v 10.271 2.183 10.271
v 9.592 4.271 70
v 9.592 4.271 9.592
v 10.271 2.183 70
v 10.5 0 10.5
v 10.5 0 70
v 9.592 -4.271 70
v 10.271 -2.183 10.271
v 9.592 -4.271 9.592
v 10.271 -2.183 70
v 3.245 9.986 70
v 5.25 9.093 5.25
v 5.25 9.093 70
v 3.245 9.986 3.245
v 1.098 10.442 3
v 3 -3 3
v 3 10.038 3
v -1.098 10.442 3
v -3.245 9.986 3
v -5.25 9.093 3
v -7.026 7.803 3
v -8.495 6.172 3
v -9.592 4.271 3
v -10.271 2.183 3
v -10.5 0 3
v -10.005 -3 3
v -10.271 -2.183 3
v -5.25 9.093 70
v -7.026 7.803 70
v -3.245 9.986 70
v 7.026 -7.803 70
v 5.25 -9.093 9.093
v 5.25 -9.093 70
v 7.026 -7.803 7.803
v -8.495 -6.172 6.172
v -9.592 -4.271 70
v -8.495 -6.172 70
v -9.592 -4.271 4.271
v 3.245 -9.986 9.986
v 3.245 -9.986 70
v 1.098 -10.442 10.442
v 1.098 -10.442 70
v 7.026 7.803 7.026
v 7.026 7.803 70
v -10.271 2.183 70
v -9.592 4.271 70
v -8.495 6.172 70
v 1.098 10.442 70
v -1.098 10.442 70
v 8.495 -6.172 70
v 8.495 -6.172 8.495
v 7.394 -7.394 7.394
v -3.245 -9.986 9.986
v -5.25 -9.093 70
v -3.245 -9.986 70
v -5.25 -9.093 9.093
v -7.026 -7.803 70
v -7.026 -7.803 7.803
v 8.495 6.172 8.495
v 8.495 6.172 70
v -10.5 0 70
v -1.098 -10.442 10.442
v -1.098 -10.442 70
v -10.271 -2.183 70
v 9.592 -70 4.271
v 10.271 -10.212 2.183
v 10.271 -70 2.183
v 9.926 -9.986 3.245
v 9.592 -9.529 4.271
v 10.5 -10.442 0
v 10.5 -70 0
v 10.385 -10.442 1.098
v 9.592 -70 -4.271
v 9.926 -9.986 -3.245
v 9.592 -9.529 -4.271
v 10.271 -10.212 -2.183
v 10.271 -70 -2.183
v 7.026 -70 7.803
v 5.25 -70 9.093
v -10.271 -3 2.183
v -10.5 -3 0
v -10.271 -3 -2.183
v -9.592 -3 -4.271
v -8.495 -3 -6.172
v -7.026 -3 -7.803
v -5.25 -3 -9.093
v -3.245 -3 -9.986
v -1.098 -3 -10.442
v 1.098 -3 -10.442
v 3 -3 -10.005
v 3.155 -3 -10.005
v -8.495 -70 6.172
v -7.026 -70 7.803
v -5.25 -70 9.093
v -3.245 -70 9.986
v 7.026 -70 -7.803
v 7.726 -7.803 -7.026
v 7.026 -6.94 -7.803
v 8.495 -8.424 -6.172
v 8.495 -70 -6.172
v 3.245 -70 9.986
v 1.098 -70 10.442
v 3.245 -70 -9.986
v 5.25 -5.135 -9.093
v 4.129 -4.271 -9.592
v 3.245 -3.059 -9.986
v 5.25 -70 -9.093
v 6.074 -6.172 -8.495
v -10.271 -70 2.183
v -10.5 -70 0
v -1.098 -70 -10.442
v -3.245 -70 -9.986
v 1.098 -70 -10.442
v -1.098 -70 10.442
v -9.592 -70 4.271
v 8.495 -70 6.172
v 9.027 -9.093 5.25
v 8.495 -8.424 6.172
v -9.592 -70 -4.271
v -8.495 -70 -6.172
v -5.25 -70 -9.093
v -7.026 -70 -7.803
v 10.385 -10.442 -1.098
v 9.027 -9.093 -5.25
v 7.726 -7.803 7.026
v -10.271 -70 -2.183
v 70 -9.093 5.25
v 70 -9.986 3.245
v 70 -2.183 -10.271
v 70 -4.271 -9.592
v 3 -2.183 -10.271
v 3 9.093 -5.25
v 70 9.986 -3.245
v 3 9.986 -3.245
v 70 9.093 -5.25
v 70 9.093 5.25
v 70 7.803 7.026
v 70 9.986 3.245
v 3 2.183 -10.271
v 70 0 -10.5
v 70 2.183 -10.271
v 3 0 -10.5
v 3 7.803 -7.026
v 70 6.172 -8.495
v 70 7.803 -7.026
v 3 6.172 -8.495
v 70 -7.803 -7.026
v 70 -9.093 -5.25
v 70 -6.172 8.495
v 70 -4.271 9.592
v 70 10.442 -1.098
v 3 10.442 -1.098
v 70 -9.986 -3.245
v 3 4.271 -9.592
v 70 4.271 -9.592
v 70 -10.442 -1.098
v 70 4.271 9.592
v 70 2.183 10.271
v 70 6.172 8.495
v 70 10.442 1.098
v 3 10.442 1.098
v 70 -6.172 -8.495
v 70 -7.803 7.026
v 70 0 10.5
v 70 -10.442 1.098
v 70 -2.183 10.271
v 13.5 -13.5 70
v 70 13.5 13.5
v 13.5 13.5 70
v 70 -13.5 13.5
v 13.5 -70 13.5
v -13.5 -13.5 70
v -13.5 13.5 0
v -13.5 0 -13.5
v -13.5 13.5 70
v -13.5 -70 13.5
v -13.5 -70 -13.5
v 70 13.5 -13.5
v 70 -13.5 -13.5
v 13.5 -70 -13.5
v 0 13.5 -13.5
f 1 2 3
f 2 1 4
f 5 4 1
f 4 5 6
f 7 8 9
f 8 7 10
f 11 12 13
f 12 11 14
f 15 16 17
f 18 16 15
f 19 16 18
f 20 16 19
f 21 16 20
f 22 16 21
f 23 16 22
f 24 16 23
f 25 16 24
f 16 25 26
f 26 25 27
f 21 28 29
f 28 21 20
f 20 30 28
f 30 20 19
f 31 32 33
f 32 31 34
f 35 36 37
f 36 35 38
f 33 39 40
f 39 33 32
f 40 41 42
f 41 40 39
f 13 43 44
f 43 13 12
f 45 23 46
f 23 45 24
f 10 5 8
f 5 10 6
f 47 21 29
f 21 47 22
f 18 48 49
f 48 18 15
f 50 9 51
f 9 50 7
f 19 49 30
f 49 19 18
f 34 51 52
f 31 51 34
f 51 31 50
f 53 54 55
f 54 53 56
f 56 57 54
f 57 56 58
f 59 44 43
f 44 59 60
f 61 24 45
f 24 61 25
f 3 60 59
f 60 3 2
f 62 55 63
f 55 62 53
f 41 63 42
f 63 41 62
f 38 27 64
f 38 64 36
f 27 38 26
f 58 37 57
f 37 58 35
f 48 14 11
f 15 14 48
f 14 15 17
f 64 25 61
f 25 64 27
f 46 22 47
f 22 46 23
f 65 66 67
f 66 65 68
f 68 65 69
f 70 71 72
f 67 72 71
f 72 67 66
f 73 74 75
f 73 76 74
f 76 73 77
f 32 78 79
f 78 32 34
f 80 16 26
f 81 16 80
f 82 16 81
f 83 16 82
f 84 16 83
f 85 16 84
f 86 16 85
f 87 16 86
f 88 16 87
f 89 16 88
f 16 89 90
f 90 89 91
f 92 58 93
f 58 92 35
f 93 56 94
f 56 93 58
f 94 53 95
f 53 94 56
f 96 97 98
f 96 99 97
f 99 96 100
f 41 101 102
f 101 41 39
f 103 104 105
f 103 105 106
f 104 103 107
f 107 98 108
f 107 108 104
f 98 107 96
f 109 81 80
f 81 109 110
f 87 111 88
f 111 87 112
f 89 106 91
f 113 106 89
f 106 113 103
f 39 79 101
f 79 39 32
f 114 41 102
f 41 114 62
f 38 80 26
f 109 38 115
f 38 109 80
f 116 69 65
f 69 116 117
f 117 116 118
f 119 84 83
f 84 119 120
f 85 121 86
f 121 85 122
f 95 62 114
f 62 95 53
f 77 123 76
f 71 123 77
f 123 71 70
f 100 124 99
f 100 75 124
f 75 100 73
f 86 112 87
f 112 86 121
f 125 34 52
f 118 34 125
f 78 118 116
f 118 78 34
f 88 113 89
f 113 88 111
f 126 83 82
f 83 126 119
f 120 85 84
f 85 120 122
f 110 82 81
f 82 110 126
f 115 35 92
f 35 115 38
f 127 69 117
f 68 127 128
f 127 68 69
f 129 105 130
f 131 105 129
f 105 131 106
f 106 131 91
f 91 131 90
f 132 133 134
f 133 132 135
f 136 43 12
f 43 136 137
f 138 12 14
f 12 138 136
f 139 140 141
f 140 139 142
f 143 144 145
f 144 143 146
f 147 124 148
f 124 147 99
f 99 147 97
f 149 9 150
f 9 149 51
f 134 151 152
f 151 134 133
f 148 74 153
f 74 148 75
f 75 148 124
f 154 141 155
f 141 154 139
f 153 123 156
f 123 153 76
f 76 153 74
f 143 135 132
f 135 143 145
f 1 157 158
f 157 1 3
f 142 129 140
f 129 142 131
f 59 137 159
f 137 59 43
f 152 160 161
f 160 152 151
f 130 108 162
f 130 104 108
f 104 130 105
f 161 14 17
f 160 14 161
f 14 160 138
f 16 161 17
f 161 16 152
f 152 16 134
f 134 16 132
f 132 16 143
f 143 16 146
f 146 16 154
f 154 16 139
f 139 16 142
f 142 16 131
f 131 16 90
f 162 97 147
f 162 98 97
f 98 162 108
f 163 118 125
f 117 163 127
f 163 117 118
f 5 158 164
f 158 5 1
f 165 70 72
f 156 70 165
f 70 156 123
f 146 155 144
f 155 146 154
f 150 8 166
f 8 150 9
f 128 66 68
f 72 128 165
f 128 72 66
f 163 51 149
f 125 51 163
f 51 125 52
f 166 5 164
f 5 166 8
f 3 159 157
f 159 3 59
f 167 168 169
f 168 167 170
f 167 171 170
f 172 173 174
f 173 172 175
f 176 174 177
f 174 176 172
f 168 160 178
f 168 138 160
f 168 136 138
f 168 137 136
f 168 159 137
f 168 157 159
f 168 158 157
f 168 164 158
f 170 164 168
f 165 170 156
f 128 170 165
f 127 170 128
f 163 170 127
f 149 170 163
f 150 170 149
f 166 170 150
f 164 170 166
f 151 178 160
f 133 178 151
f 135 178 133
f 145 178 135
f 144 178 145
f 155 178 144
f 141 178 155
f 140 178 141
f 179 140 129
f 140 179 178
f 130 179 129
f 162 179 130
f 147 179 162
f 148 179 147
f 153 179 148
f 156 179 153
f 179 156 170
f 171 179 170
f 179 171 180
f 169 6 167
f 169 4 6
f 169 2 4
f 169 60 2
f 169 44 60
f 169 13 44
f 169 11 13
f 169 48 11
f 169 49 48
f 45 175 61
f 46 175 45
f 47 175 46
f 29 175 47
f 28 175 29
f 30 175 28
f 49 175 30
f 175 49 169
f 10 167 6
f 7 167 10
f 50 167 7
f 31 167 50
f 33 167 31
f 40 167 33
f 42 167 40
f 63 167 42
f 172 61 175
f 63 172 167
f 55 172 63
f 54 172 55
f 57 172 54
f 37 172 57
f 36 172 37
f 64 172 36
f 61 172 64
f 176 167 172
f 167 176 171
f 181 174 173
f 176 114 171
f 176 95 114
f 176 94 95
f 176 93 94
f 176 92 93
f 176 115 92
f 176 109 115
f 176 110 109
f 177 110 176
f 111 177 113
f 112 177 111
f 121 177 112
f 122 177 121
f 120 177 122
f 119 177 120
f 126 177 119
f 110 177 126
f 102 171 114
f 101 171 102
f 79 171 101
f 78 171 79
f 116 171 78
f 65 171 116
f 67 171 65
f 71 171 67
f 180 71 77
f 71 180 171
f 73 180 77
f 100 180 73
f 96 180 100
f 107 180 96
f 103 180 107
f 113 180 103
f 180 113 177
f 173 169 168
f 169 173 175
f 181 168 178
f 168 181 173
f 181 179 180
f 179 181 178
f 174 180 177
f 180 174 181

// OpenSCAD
radius = 10.5;
length = 70;
wall = 3;

//Compiled Variables
side = radius*2 + wall*2;

difference() {
    hull()rot()translate([0,0,length/2])cube([side,side,length],center=true);
    rot()translate([0,0,wall])cylinder(r=radius,h=length);
}
module rot() {
    for(i=[[0,0,0],[90,0,0],[0,90,0]])rotate(i)children();
}
    
       
